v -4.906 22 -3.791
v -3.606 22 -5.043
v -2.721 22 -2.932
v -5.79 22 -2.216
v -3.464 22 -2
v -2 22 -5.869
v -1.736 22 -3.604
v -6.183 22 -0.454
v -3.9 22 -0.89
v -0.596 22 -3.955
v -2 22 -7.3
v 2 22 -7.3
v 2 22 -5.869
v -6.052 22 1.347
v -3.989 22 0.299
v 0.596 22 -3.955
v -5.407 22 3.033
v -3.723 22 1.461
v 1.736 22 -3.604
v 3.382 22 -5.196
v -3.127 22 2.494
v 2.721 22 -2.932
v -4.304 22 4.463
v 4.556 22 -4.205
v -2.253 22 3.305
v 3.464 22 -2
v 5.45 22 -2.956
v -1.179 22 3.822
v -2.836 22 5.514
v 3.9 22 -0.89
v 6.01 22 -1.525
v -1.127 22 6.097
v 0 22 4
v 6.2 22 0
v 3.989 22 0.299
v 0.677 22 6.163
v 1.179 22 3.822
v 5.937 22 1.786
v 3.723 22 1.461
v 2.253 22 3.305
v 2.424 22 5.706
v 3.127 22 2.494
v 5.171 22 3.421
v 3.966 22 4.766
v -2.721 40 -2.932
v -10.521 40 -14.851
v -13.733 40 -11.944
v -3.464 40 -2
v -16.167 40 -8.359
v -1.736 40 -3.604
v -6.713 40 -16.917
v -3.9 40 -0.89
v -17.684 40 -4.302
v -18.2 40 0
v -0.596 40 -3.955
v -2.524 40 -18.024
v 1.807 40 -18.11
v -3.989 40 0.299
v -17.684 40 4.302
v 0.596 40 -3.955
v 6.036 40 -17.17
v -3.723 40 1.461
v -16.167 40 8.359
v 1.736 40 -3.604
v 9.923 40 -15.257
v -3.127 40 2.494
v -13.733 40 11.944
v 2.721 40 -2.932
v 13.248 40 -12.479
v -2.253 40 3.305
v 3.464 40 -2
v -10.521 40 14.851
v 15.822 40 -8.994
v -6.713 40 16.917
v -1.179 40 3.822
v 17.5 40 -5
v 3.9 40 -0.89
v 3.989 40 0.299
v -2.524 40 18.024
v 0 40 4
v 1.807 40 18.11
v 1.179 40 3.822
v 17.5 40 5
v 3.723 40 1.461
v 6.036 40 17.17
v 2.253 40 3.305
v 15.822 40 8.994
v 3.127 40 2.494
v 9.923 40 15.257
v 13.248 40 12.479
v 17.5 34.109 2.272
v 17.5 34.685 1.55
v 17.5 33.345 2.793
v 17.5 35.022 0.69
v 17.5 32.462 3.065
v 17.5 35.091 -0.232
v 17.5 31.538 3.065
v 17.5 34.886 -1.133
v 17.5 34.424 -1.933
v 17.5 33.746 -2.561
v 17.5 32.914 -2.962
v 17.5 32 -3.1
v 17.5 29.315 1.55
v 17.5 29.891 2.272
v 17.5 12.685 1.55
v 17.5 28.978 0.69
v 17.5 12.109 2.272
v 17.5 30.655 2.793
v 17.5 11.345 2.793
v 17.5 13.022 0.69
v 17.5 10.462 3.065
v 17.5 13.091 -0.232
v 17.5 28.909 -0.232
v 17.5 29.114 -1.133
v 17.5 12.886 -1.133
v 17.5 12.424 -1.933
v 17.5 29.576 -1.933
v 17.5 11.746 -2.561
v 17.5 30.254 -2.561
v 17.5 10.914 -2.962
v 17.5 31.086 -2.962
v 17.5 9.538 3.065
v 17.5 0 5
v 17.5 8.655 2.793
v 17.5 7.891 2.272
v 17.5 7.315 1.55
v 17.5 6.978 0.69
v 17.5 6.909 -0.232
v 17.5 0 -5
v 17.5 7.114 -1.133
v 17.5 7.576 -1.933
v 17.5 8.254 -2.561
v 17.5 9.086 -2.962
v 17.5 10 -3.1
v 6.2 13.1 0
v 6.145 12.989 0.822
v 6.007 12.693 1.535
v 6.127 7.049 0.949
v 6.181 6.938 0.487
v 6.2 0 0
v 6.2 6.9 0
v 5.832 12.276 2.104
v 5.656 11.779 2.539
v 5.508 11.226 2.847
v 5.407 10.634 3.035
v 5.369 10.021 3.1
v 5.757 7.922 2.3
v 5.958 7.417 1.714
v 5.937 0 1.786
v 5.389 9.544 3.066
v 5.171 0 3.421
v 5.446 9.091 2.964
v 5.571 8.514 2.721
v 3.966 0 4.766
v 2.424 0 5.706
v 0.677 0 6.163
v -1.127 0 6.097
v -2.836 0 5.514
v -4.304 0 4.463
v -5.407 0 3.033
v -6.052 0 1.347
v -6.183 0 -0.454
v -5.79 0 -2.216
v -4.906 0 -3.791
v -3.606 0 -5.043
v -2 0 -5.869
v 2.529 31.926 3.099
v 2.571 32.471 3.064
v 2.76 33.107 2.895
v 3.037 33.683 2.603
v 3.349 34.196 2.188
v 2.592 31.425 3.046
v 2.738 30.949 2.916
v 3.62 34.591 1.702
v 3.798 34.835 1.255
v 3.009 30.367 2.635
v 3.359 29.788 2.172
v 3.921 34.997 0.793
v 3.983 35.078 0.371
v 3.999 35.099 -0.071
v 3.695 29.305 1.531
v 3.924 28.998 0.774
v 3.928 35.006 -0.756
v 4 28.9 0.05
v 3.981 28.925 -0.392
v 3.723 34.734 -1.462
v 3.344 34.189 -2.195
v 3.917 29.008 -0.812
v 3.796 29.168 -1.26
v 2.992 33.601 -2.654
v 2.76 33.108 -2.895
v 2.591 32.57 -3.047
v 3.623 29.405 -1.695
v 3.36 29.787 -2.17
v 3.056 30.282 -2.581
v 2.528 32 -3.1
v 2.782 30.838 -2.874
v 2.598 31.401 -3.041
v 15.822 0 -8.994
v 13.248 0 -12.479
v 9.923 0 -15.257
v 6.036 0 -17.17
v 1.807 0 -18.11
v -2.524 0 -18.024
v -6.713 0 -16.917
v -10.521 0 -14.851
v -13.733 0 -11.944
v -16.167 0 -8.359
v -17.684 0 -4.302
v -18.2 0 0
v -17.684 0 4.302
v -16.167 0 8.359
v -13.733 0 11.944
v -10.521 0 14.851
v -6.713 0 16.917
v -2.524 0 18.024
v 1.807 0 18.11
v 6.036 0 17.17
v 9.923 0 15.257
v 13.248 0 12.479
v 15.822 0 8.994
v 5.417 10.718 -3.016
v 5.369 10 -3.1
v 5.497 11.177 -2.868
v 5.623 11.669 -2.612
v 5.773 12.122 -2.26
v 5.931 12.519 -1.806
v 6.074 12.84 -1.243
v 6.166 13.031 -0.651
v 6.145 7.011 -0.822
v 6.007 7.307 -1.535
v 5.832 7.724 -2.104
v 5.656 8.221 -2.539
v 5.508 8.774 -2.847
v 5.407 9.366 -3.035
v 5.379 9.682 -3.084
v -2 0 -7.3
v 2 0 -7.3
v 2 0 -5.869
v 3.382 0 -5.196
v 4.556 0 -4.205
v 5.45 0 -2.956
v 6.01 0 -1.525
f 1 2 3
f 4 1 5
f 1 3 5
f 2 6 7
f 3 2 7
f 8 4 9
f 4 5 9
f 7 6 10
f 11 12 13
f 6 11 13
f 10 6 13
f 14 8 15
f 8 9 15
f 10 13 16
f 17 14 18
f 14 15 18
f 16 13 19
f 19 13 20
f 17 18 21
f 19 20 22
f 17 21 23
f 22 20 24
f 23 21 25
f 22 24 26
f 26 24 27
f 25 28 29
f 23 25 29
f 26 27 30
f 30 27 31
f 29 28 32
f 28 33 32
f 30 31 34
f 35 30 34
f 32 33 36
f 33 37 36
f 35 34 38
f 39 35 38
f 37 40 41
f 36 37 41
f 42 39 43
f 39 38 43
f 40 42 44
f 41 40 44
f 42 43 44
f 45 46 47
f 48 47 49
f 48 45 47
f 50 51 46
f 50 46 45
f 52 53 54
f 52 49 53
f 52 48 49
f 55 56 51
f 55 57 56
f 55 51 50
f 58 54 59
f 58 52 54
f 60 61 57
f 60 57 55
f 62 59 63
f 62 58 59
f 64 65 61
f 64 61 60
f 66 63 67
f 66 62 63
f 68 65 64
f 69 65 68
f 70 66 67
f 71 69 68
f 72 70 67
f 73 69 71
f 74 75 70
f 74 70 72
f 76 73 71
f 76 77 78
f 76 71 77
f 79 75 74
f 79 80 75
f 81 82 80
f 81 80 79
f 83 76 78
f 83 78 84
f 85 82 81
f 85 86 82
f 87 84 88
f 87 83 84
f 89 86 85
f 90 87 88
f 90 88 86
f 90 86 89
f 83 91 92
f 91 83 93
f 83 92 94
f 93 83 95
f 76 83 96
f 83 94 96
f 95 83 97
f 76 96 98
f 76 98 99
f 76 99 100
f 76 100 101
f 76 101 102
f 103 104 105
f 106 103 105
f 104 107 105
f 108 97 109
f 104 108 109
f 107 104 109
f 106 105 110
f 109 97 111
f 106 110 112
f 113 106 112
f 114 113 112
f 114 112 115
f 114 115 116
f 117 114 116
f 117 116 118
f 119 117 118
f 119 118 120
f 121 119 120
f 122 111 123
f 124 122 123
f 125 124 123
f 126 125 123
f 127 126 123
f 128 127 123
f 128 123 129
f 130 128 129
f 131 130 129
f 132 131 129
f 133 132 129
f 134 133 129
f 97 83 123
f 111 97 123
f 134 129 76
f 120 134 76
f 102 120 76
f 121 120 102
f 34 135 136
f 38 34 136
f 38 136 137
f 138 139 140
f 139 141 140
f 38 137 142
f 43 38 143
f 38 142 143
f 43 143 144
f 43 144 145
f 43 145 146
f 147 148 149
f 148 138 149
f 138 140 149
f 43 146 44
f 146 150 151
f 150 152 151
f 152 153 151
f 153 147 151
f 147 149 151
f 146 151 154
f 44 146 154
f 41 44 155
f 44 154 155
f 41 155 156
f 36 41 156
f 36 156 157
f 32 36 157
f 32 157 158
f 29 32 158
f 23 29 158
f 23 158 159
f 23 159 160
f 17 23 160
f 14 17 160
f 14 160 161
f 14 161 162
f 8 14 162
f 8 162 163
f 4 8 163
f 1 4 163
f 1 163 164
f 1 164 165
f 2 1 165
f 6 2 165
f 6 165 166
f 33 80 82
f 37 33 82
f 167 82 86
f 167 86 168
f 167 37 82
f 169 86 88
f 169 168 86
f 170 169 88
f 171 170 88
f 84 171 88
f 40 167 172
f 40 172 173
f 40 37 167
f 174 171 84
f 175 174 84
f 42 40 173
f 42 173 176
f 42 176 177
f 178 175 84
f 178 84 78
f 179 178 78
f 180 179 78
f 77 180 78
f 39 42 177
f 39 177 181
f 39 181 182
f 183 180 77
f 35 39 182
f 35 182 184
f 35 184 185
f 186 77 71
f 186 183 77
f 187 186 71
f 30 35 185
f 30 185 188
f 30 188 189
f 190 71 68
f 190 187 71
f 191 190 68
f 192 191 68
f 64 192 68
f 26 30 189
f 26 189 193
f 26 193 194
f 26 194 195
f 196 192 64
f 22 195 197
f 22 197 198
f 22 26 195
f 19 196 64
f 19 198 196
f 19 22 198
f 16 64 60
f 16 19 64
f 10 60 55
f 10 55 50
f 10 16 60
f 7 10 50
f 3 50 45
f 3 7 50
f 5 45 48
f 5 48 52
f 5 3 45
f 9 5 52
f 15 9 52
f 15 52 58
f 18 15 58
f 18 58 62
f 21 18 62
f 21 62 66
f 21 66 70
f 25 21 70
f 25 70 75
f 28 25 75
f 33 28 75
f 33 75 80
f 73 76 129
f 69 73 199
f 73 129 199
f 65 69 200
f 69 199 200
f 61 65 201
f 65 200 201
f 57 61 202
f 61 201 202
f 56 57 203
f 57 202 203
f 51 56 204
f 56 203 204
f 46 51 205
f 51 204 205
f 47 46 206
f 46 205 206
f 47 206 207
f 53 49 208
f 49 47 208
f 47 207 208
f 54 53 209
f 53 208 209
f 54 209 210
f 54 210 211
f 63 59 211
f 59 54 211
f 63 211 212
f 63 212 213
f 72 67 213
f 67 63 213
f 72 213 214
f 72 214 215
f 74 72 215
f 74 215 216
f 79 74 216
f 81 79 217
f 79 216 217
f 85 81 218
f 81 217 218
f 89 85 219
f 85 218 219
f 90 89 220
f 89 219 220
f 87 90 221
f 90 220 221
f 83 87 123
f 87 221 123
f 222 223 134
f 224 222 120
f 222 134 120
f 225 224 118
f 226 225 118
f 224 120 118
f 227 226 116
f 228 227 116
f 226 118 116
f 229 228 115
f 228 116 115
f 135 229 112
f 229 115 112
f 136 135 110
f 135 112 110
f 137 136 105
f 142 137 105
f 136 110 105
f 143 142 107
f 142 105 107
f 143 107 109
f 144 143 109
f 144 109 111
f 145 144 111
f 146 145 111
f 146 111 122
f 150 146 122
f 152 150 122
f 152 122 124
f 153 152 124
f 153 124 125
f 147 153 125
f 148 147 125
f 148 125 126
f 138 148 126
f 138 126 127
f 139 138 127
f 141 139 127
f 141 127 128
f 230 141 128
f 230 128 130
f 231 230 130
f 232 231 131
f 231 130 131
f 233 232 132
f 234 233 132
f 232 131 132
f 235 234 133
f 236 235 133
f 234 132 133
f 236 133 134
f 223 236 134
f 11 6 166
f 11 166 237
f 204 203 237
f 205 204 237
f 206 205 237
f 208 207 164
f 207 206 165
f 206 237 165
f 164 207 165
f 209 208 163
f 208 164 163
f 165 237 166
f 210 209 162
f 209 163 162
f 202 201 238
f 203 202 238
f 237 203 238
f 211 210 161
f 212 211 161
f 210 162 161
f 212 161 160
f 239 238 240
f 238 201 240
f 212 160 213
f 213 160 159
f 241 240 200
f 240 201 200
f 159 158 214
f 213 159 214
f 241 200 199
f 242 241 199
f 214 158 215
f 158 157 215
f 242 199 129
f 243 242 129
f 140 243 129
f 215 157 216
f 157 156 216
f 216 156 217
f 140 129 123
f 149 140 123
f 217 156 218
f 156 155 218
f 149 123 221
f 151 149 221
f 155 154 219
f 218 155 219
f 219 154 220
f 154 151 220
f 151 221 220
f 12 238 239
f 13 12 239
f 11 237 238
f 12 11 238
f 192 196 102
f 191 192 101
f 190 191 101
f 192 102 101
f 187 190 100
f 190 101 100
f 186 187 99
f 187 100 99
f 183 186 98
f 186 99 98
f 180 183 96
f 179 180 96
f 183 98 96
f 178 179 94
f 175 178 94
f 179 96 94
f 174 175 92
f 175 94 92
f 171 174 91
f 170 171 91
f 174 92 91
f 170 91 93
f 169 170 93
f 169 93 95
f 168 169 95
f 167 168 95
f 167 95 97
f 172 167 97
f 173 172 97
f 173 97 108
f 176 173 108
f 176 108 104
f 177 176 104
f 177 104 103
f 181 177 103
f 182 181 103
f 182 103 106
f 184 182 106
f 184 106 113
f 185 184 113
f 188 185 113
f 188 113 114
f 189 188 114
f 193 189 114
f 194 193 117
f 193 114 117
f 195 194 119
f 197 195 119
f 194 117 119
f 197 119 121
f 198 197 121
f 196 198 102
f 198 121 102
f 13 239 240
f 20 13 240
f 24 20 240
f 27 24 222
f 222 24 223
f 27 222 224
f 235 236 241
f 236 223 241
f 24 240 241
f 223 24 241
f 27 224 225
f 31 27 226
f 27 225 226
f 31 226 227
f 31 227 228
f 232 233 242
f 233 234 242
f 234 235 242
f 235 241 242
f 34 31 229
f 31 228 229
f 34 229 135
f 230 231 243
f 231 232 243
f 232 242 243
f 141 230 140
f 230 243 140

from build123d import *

# Parameters (mm, degrees)
SKETCH1_R           = 18.2
BOSS_EXTRUDE1_DEPTH = 22
SKETCH5_R           = 18.2
SKETCH5_R_2         = 4
BOSS_EXTRUDE4_DEPTH = 18
CUT_EXTRUDE1_DEPTH  = 48.56553374
SKETCH7_R           = 3.1
CUT_EXTRUDE2_DEPTH  = 18


with BuildPart() as part:
    # Sketch1 → Boss-Extrude1 (new body)
    with BuildSketch(Plane(origin=(0, 0, 0), x_dir=(1, 0, 0), z_dir=(0, 1, 0))):
        with Locations(Location((0, 0, 0), (0, 0, 270))):
            Circle(SKETCH1_R)
        with BuildLine():
            Line((2, 7.3), (2, 5.8685603))
            ThreePointArc((2, 5.8685603), (5.041825066, 3.608323711), (6.2, 0))
            ThreePointArc((6.2, 0), (-3.608323711, -5.041825066), (-2, 5.8685603))
            Line((-2, 5.8685603), (-2, 7.3))
            Line((-2, 7.3), (2, 7.3))
        make_face(mode=Mode.SUBTRACT)
    extrude(amount=BOSS_EXTRUDE1_DEPTH)

    # Sketch5 → Boss-Extrude4 (add)
    with BuildSketch(Plane(origin=(0, 22, 0), x_dir=(1, 0, 0), z_dir=(0, 1, 0))):
        with Locations(Location((0, 0, 0), (0, 0, 270))):
            Circle(SKETCH5_R)
        with Locations(Location((0, 0, 0), (0, 0, 270))):
            Circle(SKETCH5_R_2, mode=Mode.SUBTRACT)
    extrude(amount=BOSS_EXTRUDE4_DEPTH)

    # Sketch6 → Cut-Extrude1 (cut, through all)
    with BuildSketch(Plane.XZ):
        Polygon((17.499714283, 100.15185494), (17.499714283, 5), (17.499714283, -5), (17.499714283, -100.15185494), (207.803424163, -100.15185494), (207.803424163, 100.15185494), align=None)
    extrude(amount=-CUT_EXTRUDE1_DEPTH, mode=Mode.SUBTRACT)

    # Sketch7 → Cut-Extrude2 (cut)
    with BuildSketch(Plane(origin=(17.499714283, 0, 0), x_dir=(0, 0, -1), z_dir=(1, 0, 0))):
        with Locations((0, 10)):
            Circle(SKETCH7_R)
        with Locations((0, 32)):
            Circle(SKETCH7_R)
    extrude(amount=-CUT_EXTRUDE2_DEPTH, mode=Mode.SUBTRACT)


solid = part.part
